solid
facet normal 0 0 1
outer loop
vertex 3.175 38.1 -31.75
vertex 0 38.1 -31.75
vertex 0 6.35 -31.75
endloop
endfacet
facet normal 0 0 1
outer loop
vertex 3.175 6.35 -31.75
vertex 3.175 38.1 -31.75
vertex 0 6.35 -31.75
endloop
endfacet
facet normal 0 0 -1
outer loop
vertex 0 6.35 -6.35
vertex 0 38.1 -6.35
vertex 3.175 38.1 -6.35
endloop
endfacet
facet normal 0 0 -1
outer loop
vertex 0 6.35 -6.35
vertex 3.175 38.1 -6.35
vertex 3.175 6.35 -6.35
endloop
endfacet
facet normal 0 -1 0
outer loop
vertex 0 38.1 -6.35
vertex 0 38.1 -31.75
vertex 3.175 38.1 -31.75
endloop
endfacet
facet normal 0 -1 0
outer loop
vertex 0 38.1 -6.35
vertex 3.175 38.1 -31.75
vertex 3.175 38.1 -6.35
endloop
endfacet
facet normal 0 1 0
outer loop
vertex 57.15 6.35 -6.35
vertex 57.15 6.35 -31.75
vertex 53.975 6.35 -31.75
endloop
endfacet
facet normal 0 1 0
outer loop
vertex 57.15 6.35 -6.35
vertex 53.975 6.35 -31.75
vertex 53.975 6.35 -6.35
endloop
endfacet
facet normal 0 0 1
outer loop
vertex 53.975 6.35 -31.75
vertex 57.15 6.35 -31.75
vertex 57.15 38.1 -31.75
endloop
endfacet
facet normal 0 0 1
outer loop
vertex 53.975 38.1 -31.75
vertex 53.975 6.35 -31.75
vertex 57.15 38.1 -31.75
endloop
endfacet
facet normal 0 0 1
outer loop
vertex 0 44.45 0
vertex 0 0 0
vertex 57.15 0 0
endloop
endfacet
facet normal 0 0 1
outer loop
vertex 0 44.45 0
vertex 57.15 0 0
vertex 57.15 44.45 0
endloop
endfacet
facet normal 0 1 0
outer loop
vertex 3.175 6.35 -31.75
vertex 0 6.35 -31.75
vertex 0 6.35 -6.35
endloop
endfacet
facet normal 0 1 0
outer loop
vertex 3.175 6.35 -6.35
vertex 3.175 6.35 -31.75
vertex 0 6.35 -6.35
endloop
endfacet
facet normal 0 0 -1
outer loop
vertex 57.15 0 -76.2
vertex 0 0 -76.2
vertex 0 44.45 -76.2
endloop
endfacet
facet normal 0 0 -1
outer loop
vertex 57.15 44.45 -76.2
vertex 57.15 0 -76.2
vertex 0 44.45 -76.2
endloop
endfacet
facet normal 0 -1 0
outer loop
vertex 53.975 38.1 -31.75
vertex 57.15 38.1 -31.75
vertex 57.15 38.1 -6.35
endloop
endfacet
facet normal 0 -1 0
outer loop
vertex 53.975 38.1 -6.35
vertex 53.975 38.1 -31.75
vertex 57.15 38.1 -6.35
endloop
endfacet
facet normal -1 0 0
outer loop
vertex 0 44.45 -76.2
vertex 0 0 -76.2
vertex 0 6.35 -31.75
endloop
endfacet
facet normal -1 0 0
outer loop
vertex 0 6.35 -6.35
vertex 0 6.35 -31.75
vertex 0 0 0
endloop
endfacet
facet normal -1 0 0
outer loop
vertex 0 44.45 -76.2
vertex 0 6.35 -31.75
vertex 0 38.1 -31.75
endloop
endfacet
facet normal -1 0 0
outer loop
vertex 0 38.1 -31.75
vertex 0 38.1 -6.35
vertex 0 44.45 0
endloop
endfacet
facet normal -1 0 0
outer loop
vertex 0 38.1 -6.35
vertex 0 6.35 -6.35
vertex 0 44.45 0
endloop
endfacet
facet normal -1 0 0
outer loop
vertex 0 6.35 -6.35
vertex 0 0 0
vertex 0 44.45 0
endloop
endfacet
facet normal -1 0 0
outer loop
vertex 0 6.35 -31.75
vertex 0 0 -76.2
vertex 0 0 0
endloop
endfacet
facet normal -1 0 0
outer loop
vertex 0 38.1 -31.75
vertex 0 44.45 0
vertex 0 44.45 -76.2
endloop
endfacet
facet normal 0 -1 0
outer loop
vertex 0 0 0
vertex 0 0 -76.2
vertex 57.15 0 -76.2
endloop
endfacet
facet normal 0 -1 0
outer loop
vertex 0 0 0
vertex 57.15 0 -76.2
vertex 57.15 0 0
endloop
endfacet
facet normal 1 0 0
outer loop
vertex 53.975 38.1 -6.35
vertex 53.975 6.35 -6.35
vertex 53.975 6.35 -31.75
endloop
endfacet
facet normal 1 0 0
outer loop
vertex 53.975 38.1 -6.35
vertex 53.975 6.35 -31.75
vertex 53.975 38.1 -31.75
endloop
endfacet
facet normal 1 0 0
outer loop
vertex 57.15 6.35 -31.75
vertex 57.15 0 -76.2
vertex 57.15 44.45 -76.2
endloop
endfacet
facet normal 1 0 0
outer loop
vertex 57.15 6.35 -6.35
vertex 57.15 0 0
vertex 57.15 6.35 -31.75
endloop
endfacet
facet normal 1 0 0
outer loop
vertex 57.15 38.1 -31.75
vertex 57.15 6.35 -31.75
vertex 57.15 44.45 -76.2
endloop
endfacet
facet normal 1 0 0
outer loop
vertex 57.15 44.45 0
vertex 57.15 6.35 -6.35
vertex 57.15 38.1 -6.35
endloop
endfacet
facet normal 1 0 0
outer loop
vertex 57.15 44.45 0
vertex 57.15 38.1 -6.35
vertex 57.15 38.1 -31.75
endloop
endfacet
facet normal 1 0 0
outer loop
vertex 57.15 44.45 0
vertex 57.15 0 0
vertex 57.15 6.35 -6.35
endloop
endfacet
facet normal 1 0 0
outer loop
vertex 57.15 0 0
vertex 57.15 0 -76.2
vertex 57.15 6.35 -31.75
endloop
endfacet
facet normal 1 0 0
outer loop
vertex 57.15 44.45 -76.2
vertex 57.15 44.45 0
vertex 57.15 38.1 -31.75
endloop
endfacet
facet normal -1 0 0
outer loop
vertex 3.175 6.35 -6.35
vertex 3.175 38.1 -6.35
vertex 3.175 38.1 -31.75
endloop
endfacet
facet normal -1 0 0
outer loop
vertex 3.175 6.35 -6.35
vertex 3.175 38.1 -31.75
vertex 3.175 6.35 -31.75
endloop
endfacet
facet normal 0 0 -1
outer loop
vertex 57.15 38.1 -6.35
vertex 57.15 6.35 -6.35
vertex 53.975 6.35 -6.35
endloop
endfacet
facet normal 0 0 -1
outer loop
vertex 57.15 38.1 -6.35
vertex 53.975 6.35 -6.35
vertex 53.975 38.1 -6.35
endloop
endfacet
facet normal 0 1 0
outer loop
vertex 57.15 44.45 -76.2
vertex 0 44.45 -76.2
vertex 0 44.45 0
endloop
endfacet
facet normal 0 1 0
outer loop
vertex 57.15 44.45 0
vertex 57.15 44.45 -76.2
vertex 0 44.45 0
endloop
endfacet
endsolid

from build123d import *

# Parameters (mm, degrees)
F0_W     = 44.45
F0_H     = 76.2
F1_DEPTH = 57.15
F2_W     = 31.75
F2_H     = 25.4
F3_DEPTH = 3.175
F4_W     = 31.75
F4_H     = 25.4
F5_DEPTH = 3.175


with BuildPart() as f1:
    # F0 (on Right) → F1 (new body)
    with BuildSketch(Plane.YZ):
        with Locations((22.225, -38.1)):
            Rectangle(F0_W, F0_H)
    extrude(amount=F1_DEPTH)

    # F2 (on face) → F3 (cut)
    with BuildSketch(Plane.YZ.offset(57.15)):
        with Locations((22.225, -19.05)):
            Rectangle(F2_W, F2_H)
    extrude(amount=-F3_DEPTH, mode=Mode.SUBTRACT)

    # F4 (on face) → F5 (cut)
    with BuildSketch(Plane(origin=(0, 0, 0), x_dir=(0, -1, 0), z_dir=(-1, 0, 0))):
        with Locations((-22.225, -19.05)):
            Rectangle(F4_W, F4_H)
    extrude(amount=-F5_DEPTH, mode=Mode.SUBTRACT)


solid = f1.part
